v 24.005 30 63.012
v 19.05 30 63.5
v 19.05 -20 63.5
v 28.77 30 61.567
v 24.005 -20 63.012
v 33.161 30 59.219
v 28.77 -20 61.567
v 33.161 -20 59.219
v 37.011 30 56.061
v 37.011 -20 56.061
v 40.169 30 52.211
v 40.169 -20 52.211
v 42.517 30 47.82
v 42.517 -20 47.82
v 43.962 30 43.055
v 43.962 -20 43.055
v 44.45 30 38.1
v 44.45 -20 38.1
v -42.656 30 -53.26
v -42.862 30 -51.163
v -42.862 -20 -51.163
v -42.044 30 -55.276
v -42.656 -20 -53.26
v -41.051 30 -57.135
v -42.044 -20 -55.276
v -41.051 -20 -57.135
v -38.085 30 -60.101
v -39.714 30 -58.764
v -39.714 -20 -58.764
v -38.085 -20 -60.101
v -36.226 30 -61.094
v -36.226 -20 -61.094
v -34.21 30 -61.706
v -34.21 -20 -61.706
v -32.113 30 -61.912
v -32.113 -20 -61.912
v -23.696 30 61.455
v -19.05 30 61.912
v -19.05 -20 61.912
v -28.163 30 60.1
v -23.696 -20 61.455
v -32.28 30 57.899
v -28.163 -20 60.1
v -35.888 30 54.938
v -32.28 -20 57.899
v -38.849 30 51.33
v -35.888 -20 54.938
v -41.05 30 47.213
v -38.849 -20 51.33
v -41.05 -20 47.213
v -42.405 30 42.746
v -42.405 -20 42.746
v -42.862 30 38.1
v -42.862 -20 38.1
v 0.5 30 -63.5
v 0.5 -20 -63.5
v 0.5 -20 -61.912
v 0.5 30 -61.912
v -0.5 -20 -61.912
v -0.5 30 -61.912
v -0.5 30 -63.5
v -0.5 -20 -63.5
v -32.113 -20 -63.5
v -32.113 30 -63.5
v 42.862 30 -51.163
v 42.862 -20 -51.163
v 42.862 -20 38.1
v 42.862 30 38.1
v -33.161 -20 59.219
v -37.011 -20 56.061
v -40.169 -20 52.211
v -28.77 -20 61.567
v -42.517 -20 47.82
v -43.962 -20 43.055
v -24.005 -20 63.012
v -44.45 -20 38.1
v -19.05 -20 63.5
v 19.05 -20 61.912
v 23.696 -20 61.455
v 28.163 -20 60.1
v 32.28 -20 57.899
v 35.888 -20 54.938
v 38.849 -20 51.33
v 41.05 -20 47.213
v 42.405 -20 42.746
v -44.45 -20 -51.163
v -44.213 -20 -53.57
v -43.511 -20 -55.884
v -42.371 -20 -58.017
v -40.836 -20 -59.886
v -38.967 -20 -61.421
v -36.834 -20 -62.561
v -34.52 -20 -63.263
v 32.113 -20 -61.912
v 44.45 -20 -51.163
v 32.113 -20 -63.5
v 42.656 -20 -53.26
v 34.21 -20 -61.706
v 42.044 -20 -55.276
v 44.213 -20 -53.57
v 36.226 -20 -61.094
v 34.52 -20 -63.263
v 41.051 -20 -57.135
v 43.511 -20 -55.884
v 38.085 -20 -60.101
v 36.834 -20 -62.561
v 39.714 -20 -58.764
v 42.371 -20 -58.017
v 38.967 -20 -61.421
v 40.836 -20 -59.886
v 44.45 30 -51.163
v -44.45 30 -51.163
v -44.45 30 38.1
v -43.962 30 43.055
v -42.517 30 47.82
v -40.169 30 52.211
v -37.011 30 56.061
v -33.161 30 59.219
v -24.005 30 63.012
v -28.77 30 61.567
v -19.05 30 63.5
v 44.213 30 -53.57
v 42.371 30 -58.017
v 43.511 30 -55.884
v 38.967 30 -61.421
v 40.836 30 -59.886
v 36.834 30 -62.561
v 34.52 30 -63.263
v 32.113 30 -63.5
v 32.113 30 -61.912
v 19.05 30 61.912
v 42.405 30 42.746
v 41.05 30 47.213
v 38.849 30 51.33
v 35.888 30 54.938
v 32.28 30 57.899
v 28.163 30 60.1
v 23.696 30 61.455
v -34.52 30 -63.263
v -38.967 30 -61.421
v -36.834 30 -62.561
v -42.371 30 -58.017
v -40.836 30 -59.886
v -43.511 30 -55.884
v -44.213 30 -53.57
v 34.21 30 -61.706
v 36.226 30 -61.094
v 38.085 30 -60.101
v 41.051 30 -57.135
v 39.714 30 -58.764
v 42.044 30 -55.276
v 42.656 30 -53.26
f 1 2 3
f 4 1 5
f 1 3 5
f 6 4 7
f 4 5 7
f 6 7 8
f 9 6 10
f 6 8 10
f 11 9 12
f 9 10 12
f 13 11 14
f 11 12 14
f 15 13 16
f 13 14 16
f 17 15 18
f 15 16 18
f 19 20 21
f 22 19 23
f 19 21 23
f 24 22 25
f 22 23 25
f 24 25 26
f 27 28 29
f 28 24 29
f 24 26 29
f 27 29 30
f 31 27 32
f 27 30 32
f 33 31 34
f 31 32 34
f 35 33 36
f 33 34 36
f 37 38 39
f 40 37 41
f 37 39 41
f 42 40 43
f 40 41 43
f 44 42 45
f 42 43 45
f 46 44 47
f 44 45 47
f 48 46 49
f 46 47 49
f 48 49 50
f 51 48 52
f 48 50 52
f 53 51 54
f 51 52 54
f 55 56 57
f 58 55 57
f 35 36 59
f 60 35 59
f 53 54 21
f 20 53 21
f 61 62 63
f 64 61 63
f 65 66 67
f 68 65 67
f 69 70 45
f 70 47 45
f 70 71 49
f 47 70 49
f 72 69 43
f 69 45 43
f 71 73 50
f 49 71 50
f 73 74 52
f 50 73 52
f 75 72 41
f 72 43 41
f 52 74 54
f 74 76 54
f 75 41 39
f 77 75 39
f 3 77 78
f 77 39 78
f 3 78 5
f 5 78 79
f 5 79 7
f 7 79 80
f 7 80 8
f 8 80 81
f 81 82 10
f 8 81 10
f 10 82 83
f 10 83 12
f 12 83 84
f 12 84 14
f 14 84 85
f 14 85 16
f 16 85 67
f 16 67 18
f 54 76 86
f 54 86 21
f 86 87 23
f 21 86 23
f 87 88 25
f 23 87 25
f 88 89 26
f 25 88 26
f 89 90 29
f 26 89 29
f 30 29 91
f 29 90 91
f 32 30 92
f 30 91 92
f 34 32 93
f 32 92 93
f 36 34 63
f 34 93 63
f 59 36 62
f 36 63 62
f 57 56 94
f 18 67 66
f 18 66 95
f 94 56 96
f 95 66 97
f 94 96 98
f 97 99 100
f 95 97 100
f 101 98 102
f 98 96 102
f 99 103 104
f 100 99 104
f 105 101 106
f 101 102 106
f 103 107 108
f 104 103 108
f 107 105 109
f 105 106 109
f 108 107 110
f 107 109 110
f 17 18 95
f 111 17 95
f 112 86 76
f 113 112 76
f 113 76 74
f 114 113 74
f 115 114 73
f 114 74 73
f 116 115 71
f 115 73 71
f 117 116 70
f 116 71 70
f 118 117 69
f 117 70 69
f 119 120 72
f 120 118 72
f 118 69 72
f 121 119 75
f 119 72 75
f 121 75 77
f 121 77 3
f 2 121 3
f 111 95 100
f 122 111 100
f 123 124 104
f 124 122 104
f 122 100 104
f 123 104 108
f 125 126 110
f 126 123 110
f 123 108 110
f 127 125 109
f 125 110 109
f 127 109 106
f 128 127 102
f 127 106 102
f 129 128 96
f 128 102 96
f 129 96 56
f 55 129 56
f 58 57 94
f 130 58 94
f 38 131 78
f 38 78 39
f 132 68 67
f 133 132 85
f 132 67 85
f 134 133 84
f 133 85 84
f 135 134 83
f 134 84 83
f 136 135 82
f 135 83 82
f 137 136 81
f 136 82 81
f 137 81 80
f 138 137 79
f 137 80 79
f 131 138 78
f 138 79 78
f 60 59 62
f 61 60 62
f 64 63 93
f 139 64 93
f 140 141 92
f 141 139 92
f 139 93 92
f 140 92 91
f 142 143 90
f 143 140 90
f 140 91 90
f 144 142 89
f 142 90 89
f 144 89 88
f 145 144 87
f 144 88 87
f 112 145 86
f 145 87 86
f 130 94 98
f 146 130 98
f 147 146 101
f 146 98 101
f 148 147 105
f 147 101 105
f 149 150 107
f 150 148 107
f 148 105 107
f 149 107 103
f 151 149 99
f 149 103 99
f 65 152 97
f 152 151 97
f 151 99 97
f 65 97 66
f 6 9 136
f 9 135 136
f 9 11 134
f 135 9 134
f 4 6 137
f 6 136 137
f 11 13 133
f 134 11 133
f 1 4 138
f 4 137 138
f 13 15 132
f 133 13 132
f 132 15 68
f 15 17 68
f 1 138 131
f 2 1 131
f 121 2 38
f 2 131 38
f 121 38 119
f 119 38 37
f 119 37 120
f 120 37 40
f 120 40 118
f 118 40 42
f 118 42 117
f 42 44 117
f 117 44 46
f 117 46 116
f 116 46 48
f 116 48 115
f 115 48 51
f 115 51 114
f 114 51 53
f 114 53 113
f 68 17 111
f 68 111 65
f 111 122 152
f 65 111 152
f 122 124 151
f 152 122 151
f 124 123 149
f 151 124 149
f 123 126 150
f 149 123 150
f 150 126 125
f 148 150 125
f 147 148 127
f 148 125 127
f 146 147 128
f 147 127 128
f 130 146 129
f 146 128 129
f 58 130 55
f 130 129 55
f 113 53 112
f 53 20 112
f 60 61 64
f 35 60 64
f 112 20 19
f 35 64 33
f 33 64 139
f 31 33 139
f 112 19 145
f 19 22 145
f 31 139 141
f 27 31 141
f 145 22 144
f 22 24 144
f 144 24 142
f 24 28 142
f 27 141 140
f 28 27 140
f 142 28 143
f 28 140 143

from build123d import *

# Parameters (mm, degrees)
EXTRUDE_THIN1_DEPTH  = 30
CONVERT_SOLID1_START = -20
CONVERT_SOLID1_DEPTH = 20


# Read off the part's stored shape, not the designer's step: Convert-Solid1
with BuildPart() as part:
    # Sketch1 → Extrude-Thin1 (new body)
    with BuildSketch(Plane(origin=(0, 0, 0), x_dir=(1, 0, 0), z_dir=(0, 1, 0))):
        with BuildLine():
            Line((0.5, 63.5), (32.11260948, 63.5))
            ThreePointArc((32.11260948, 63.5), (40.836461979, 59.886461979), (44.45, 51.16260948))
            Line((44.45, 51.16260948), (44.45, -38.1))
            ThreePointArc((44.45, -38.1), (37.010512242, -56.060512242), (19.05, -63.5))
            Line((19.05, -63.5), (-19.05, -63.5))
            ThreePointArc((-19.05, -63.5), (-37.010512242, -56.060512242), (-44.45, -38.1))
            Line((-44.45, -38.1), (-44.45, 51.16260948))
            ThreePointArc((-44.45, 51.16260948), (-40.836461979, 59.886461979), (-32.11260948, 63.5))
            Line((-32.11260948, 63.5), (-0.5, 63.5))
            Line((-0.5, 63.5), (-0.5, 61.9125))
            Line((-0.5, 61.9125), (-32.11260948, 61.9125))
            ThreePointArc((-32.11260948, 61.9125), (-39.713929964, 58.763929964), (-42.8625, 51.16260948))
            Line((-42.8625, 51.16260948), (-42.8625, -38.1))
            ThreePointArc((-42.8625, -38.1), (-35.887980227, -54.937980227), (-19.05, -61.9125))
            Line((-19.05, -61.9125), (19.05, -61.9125))
            ThreePointArc((19.05, -61.9125), (35.887980227, -54.937980227), (42.8625, -38.1))
            Line((42.8625, -38.1), (42.8625, 51.16260948))
            ThreePointArc((42.8625, 51.16260948), (39.713929964, 58.763929964), (32.11260948, 61.9125))
            Line((32.11260948, 61.9125), (0.5, 61.9125))
            Line((0.5, 61.9125), (0.5, 63.5))
        make_face()
    extrude(amount=EXTRUDE_THIN1_DEPTH)

    # Convert-Solid1 outline → Convert-Solid1 (add)
    with BuildSketch(Plane(origin=(0, 0, 0), x_dir=(1, 0, 0), z_dir=(0, 1, 0)).offset(CONVERT_SOLID1_START)):
        with BuildLine():
            Line((0.5, 61.9125), (32.11260948, 61.9125))
            ThreePointArc((32.11260948, 61.9125), (39.713929964, 58.763929964), (42.8625, 51.16260948))
            Line((42.8625, 51.16260948), (42.8625, -38.1))
            ThreePointArc((42.8625, -38.1), (35.887980227, -54.937980227), (19.05, -61.9125))
            Line((19.05, -61.9125), (-19.05, -61.9125))
            ThreePointArc((-19.05, -61.9125), (-35.887980227, -54.937980227), (-42.8625, -38.1))
            Line((-42.8625, -38.1), (-42.8625, 51.16260948))
            ThreePointArc((-42.8625, 51.16260948), (-39.713929964, 58.763929964), (-32.11260948, 61.9125))
            Line((-32.11260948, 61.9125), (-0.5, 61.9125))
            Line((-0.5, 61.9125), (-0.5, 63.5))
            Line((-0.5, 63.5), (-32.11260948, 63.5))
            ThreePointArc((-32.11260948, 63.5), (-40.836461979, 59.886461979), (-44.45, 51.16260948))
            Line((-44.45, 51.16260948), (-44.45, -38.1))
            ThreePointArc((-44.45, -38.1), (-37.010512242, -56.060512242), (-19.05, -63.5))
            Line((-19.05, -63.5), (19.05, -63.5))
            ThreePointArc((19.05, -63.5), (37.010512242, -56.060512242), (44.45, -38.1))
            Line((44.45, -38.1), (44.45, 51.16260948))
            ThreePointArc((44.45, 51.16260948), (40.836461979, 59.886461979), (32.11260948, 63.5))
            Line((32.11260948, 63.5), (0.5, 63.5))
            Line((0.5, 63.5), (0.5, 61.9125))
        make_face()
    extrude(amount=CONVERT_SOLID1_DEPTH)


solid = part.part
